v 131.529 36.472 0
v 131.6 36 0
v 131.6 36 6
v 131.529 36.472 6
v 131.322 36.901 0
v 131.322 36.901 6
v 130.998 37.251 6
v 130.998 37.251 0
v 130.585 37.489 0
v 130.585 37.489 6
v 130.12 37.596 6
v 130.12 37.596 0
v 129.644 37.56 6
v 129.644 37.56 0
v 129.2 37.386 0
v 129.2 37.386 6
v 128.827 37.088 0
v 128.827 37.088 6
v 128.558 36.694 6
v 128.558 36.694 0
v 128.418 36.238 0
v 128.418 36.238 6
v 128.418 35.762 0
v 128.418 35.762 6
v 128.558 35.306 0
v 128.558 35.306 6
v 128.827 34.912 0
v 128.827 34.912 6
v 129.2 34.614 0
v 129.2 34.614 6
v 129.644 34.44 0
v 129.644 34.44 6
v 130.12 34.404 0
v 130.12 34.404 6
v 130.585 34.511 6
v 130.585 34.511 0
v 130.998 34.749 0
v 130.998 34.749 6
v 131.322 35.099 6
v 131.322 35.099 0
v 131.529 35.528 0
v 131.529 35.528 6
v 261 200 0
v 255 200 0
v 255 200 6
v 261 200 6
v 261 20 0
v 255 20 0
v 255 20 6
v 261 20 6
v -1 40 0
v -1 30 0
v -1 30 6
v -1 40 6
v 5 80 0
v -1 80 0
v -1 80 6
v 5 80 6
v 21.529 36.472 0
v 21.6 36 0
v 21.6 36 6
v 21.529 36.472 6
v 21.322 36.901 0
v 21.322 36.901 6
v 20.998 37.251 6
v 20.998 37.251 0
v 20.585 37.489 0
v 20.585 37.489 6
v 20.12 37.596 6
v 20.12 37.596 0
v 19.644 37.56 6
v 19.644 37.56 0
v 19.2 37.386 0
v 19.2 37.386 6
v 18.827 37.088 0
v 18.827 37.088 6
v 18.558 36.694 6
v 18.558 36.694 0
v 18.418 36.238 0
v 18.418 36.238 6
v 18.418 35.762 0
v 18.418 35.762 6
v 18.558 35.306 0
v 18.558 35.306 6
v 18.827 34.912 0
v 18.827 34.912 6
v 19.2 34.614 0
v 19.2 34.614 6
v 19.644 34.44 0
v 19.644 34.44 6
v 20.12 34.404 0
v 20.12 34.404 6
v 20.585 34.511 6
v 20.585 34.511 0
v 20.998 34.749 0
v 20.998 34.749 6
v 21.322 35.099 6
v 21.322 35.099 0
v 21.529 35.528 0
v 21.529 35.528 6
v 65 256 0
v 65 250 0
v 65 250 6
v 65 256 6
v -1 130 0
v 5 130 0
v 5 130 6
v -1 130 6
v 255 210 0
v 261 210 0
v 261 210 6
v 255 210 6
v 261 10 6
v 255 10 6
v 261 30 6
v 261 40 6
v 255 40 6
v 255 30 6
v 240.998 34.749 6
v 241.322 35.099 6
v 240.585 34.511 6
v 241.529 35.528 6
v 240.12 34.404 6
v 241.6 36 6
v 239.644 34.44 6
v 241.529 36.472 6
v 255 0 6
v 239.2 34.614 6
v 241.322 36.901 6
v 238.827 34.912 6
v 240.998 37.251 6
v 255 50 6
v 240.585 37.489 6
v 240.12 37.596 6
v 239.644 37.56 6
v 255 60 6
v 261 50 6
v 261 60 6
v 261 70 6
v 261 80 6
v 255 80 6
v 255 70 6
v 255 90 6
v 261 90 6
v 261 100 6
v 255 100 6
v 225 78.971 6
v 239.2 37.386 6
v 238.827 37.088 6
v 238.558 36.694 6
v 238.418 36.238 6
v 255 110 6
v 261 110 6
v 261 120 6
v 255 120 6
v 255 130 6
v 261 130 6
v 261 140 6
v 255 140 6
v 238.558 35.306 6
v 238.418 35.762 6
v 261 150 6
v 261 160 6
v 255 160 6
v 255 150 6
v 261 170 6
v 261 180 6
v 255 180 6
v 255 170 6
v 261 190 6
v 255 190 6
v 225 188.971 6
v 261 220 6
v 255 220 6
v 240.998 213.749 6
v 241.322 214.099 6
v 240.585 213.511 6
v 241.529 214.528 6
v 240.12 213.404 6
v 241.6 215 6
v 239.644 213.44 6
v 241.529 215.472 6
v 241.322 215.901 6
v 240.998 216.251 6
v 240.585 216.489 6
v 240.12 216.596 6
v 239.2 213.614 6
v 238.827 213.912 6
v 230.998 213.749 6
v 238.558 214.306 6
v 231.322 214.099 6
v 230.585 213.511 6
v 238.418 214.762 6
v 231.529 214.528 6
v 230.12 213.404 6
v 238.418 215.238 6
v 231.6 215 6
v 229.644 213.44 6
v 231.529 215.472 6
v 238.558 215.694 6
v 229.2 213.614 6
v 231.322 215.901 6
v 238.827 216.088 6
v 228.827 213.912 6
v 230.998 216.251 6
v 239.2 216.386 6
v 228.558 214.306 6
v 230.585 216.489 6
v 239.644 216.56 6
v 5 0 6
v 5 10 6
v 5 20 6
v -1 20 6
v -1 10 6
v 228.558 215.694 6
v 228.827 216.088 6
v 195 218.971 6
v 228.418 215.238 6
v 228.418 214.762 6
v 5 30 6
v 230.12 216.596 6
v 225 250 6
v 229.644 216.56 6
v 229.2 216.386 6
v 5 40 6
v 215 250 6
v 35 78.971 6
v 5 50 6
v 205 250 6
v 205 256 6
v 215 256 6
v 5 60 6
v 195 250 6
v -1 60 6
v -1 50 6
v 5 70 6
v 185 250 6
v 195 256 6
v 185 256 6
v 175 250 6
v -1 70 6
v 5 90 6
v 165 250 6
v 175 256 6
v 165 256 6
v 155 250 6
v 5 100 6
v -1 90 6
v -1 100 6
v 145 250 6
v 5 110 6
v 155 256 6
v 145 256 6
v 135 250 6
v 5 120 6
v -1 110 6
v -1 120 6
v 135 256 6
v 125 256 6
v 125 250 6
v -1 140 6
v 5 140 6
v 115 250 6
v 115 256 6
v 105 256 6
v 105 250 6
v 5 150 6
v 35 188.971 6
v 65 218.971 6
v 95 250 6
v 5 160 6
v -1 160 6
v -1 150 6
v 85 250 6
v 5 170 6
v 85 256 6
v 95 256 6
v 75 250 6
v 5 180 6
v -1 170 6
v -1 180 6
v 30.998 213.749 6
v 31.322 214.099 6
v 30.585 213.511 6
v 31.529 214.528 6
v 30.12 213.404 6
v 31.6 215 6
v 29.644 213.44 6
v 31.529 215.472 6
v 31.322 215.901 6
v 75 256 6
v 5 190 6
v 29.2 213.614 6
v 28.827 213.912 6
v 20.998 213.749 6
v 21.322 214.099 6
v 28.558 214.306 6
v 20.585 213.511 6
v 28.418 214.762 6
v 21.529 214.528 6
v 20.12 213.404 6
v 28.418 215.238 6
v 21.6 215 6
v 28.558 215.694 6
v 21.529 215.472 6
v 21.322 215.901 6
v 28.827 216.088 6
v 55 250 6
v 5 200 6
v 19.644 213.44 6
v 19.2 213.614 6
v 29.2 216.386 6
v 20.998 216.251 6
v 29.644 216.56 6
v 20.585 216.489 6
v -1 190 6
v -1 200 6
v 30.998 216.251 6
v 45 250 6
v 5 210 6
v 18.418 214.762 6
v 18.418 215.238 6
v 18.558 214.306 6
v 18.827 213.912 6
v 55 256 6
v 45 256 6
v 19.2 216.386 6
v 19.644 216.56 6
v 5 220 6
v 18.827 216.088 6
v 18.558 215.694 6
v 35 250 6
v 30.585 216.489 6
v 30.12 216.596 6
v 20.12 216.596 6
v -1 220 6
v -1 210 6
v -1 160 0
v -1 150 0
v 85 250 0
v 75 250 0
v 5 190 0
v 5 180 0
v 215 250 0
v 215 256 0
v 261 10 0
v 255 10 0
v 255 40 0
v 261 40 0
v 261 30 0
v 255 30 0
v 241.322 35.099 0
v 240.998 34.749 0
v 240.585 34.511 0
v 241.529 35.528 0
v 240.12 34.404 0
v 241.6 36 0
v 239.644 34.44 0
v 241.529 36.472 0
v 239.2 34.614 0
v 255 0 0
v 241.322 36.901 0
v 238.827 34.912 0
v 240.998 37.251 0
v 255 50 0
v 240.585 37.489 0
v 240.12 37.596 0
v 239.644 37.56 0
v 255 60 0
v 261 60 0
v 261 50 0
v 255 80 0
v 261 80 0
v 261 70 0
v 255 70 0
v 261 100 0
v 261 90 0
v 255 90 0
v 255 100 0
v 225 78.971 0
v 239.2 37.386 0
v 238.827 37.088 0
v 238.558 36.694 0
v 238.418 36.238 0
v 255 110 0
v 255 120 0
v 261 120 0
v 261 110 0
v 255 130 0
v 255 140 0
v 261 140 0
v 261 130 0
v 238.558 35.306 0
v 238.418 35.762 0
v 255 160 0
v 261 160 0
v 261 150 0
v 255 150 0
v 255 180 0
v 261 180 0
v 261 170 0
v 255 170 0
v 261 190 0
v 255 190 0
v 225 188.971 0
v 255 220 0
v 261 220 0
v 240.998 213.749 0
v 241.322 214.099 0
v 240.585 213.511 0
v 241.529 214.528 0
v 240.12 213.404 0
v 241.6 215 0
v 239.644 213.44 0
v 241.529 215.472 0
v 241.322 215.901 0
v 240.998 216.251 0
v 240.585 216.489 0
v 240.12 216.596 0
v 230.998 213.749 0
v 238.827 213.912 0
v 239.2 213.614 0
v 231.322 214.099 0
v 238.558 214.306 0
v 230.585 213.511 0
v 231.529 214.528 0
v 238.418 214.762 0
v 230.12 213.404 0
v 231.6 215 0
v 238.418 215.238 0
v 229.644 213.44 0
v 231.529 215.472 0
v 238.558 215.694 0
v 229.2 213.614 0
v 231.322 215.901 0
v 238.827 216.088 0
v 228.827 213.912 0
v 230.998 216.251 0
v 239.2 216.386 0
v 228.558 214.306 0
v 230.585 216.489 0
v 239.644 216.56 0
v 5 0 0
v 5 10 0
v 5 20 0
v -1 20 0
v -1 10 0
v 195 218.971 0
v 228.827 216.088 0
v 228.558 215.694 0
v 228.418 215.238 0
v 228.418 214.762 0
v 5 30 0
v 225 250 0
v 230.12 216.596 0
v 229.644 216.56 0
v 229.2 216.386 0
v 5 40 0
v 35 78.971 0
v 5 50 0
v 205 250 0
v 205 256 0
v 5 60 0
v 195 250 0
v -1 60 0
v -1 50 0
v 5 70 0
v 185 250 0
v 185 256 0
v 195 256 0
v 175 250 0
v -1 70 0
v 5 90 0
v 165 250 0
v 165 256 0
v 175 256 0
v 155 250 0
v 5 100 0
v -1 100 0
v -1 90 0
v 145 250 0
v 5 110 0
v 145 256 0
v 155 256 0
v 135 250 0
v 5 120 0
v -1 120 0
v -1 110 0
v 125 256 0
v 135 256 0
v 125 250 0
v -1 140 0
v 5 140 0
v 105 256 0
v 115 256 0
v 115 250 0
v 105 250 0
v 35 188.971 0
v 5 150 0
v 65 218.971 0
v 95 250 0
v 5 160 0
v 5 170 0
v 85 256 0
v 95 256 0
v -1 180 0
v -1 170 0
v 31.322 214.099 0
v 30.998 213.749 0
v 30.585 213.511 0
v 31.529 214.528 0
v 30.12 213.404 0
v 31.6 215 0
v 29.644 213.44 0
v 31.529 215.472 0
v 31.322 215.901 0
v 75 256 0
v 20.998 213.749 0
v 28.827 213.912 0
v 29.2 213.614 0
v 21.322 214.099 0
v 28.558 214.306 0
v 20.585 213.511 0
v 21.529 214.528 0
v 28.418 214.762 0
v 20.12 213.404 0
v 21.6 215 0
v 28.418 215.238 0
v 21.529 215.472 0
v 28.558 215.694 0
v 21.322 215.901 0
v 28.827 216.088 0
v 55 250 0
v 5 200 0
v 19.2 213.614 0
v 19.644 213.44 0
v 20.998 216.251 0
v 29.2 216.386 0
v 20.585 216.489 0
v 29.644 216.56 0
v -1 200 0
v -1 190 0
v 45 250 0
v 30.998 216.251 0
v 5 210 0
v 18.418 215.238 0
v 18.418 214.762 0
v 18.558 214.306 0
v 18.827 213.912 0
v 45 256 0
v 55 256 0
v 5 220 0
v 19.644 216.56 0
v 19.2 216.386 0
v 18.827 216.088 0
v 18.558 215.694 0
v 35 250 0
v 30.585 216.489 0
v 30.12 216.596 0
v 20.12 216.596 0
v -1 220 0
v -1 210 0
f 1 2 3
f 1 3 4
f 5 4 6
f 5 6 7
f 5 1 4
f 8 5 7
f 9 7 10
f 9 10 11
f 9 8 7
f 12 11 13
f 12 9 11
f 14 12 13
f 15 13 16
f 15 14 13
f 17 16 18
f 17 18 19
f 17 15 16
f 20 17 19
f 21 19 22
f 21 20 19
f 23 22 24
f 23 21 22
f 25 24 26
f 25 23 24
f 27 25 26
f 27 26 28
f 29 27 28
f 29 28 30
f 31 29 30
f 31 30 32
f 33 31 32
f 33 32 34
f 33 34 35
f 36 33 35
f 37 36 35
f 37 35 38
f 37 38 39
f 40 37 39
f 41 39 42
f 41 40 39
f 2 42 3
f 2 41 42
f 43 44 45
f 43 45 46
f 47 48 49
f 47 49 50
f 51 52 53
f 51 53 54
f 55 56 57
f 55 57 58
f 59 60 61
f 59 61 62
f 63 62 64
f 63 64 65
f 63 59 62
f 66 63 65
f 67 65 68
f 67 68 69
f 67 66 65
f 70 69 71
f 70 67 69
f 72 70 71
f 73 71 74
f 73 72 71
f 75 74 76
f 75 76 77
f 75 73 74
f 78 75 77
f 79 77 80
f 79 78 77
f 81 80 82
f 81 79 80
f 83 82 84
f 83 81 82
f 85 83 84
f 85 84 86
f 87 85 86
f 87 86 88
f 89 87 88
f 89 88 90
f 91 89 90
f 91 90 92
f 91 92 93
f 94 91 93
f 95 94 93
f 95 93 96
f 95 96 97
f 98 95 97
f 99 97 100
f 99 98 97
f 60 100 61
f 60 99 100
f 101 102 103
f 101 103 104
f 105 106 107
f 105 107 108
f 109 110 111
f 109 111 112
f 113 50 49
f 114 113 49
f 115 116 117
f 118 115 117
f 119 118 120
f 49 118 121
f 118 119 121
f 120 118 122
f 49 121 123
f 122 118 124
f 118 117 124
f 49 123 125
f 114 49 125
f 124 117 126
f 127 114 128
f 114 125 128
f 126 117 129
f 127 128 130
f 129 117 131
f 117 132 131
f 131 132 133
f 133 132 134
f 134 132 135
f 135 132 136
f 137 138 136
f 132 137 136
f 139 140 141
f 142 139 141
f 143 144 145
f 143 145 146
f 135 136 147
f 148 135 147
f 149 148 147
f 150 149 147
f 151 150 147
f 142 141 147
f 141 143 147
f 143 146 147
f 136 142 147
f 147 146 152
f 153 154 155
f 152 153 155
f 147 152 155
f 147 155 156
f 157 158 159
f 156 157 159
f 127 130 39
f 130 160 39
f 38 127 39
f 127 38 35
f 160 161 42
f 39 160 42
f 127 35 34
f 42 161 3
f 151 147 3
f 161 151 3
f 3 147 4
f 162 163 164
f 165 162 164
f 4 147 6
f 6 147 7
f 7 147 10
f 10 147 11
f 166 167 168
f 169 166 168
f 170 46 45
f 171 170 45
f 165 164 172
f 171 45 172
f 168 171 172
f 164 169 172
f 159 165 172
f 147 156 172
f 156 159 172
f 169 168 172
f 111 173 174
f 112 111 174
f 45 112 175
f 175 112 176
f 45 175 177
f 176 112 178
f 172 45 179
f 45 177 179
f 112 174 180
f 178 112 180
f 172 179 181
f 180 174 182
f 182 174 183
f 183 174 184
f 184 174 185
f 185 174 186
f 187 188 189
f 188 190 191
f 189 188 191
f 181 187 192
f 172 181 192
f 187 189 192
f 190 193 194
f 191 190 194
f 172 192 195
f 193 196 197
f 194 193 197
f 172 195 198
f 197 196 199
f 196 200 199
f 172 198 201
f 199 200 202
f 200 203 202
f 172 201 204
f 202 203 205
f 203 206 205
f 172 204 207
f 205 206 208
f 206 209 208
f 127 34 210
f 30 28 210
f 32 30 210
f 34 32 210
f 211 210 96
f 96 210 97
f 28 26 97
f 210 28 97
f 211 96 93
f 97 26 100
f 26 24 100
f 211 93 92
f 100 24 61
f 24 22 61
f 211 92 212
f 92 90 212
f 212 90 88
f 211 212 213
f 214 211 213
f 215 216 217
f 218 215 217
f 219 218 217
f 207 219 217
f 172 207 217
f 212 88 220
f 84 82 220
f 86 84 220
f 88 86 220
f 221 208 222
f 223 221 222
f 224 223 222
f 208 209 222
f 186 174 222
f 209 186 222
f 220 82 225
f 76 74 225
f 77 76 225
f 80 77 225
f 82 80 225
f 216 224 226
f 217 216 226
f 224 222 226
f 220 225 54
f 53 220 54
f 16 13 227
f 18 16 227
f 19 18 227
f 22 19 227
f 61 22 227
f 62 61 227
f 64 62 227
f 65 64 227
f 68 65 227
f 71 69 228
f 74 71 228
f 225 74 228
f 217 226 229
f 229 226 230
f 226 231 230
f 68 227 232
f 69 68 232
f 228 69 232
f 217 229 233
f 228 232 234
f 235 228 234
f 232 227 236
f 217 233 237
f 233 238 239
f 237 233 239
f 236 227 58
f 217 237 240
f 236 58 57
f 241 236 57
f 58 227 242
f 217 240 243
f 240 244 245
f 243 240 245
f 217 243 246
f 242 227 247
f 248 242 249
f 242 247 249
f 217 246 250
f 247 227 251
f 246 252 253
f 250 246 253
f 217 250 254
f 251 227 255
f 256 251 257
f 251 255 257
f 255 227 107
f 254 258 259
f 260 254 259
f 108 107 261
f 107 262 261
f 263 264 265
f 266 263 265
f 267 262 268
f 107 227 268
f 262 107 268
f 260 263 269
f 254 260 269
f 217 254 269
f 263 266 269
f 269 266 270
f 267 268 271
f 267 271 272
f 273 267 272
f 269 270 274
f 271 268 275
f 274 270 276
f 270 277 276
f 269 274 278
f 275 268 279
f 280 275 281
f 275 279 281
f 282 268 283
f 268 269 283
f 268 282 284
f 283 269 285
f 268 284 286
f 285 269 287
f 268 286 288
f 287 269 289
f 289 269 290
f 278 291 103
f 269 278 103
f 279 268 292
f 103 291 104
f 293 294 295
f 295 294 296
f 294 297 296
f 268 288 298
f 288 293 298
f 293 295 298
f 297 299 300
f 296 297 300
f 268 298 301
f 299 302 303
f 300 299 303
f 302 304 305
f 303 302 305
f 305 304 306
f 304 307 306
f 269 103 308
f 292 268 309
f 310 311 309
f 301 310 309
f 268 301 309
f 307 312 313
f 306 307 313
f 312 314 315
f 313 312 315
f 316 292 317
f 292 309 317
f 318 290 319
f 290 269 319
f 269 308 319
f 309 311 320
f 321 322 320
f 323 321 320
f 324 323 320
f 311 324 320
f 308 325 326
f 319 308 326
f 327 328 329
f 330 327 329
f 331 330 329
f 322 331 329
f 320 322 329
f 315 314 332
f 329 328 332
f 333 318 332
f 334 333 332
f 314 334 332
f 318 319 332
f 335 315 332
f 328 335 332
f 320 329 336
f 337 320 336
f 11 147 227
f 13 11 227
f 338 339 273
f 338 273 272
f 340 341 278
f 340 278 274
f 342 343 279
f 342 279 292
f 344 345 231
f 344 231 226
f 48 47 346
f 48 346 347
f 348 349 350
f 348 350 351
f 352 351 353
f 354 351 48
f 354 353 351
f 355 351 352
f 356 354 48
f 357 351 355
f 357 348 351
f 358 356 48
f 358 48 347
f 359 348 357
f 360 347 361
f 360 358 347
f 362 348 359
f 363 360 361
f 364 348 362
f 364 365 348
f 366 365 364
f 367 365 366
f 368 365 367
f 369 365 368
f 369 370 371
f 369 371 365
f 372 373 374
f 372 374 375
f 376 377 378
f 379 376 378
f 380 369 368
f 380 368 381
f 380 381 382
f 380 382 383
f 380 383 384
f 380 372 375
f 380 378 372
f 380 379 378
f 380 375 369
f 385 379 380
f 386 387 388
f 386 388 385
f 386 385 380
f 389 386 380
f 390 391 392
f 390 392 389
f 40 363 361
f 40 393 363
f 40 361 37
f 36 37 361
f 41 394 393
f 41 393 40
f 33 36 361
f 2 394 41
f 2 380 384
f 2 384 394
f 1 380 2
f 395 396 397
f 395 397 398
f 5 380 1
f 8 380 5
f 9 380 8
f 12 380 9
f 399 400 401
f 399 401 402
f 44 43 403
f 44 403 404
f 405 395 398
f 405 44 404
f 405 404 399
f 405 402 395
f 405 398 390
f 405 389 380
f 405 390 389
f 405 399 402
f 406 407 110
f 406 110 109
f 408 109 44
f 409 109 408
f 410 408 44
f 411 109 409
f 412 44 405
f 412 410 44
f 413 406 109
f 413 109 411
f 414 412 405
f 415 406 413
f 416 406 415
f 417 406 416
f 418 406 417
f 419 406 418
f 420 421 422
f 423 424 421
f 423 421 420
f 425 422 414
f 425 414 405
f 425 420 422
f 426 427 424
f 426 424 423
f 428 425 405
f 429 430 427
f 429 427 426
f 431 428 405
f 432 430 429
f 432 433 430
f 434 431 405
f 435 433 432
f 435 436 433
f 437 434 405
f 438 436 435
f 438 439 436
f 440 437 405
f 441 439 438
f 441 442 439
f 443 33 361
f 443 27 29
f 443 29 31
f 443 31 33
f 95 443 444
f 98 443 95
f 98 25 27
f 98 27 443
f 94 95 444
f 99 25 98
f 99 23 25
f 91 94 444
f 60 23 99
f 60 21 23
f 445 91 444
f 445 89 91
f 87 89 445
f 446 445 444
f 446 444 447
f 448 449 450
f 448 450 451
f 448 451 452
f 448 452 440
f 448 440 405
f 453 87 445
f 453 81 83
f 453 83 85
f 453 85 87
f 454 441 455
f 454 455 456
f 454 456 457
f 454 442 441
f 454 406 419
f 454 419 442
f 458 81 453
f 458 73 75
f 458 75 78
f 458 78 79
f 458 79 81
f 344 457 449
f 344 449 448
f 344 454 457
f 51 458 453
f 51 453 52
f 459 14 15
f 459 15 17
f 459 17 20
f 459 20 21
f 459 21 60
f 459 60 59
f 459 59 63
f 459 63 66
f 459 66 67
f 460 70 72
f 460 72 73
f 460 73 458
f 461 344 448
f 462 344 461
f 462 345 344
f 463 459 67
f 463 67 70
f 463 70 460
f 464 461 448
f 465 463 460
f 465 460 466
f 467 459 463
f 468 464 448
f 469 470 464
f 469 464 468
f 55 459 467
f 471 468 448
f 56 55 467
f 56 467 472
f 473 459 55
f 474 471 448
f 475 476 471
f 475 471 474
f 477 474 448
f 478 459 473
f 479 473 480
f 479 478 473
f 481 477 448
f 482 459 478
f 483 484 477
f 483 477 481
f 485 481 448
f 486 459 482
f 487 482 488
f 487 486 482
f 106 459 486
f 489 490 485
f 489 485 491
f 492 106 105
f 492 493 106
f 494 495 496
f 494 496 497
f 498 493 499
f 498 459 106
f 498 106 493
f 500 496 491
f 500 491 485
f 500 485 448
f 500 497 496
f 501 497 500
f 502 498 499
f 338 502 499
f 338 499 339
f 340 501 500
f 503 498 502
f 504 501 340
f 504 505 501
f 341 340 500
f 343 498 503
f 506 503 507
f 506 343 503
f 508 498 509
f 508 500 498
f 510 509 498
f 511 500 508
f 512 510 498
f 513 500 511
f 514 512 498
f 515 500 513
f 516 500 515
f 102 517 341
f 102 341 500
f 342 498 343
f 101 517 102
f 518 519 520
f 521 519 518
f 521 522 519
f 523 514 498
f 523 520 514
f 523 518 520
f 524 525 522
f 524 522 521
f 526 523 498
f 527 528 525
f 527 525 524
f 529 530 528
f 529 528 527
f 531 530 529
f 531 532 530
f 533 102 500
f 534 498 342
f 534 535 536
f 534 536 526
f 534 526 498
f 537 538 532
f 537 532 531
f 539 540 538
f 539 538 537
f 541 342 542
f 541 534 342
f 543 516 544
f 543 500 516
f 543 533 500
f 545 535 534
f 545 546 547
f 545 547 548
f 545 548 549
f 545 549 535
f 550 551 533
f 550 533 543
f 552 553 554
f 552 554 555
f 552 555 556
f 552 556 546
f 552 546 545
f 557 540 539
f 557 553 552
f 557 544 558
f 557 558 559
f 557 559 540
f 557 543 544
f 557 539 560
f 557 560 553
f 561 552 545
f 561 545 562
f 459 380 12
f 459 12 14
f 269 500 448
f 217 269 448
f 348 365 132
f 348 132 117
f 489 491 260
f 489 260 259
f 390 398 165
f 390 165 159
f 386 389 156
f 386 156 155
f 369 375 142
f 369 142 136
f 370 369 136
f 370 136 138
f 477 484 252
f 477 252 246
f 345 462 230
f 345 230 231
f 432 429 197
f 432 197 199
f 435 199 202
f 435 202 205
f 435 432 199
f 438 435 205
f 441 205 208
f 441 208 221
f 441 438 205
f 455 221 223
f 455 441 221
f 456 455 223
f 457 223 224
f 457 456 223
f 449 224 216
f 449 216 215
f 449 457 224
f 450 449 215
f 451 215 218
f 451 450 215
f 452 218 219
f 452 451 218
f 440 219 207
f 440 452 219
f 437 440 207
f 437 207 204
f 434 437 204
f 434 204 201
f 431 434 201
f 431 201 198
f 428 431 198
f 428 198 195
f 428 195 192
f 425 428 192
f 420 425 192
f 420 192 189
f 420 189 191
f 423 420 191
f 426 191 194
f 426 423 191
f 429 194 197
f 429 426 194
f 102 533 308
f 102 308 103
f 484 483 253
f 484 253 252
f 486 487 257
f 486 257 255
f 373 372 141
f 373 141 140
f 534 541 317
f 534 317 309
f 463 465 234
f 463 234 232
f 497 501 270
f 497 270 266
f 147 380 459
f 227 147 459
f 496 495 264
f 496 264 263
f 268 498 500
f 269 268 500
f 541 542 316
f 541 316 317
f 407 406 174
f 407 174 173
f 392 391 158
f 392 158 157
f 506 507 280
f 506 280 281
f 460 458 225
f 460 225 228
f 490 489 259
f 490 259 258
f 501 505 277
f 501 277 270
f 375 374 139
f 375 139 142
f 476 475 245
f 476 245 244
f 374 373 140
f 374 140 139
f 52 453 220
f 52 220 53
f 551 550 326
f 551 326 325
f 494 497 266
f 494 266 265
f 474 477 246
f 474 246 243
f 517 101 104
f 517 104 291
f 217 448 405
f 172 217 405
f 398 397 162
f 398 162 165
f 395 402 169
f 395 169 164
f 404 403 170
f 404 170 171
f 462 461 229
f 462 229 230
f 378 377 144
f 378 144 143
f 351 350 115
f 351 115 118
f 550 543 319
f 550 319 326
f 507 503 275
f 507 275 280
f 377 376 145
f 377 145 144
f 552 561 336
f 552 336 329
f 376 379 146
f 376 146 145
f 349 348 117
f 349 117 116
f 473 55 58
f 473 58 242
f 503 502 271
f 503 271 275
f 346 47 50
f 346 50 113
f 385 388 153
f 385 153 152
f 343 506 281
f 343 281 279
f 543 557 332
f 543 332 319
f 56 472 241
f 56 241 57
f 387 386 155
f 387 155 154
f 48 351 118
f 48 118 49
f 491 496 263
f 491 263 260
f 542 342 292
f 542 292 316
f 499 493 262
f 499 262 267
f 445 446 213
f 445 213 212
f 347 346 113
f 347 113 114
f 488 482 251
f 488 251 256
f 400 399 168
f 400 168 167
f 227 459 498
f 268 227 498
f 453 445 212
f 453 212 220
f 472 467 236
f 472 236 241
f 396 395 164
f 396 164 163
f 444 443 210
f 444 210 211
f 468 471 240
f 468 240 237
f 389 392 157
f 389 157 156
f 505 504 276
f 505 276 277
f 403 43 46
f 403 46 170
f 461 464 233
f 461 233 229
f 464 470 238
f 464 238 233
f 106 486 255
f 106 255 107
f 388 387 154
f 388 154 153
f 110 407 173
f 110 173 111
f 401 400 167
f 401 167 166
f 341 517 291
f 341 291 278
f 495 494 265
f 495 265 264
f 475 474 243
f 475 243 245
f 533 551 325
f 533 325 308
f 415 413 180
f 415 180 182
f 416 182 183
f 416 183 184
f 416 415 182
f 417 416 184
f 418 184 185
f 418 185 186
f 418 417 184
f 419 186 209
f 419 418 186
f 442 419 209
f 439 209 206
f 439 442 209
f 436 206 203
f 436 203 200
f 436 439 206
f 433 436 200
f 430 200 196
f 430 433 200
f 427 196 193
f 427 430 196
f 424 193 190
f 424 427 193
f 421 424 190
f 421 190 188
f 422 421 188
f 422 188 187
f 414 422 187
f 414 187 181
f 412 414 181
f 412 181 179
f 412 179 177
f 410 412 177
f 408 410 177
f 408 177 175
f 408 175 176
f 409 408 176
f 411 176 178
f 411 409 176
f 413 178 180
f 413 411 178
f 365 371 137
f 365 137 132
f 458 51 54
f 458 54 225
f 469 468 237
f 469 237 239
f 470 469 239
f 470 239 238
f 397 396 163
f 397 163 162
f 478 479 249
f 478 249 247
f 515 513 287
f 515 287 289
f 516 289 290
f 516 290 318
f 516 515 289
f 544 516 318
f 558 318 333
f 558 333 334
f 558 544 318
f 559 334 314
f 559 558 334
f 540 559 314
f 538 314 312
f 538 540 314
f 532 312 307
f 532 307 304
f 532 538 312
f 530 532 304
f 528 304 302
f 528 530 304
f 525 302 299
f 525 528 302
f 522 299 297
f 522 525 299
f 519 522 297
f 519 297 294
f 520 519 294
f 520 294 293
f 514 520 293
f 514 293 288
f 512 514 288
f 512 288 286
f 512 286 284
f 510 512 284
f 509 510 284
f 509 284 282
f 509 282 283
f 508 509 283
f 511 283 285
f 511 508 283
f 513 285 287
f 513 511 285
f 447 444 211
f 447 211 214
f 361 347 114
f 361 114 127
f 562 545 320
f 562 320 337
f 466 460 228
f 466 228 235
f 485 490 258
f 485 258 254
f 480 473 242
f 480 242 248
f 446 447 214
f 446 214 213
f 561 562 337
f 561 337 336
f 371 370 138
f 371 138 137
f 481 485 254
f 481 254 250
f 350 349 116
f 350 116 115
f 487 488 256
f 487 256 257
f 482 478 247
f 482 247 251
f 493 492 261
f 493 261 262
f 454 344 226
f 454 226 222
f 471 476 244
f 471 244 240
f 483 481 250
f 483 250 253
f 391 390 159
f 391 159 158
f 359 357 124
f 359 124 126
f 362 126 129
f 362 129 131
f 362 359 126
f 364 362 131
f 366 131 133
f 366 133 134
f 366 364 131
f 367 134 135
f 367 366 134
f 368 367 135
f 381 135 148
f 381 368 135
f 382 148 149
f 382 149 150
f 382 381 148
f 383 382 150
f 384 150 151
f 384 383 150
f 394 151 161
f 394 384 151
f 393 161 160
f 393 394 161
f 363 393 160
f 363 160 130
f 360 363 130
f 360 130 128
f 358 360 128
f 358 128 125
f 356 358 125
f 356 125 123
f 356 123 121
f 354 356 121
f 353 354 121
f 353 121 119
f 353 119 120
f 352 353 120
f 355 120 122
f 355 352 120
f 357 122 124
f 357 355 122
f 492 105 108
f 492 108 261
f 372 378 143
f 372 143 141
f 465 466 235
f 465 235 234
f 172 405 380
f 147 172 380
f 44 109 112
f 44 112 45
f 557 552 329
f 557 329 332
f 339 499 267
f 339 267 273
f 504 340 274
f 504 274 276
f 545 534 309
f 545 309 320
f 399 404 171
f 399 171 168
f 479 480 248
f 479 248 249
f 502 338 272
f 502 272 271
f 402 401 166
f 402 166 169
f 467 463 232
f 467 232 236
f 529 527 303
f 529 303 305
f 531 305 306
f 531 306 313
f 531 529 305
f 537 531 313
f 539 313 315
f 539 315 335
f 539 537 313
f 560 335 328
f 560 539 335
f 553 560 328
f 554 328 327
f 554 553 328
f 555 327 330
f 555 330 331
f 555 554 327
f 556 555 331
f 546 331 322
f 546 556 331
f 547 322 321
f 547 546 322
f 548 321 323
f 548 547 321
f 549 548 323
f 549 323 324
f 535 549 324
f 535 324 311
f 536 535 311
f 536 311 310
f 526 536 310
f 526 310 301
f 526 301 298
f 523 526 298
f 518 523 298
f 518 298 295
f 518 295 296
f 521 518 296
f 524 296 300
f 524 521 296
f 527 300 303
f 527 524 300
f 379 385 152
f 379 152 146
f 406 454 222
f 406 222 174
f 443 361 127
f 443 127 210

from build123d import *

# Parameters (mm, degrees)
SKIZZE1_R                       = 1.6
AUFSATZ_LINEAR_AUSTRAGEN1_DEPTH = 6


with BuildPart() as part:
    # Skizze1 → Aufsatz-Linear austragen1 (new body)
    with BuildSketch(Plane.XY):
        Polygon((35, 250), (45, 250), (45, 256), (55, 256), (55, 250), (65, 250), (65, 256), (75, 256), (75, 250), (85, 250), (85, 256), (95, 256), (95, 250), (105, 250), (105, 256), (115, 256), (115, 250), (125, 250), (125, 256), (135, 256), (135, 250), (145, 250), (145, 256), (155, 256), (155, 250), (165, 250), (165, 256), (175, 256), (175, 250), (185, 250), (185, 256), (195, 256), (195, 250), (205, 250), (205, 256), (215, 256), (215, 250), (225, 250), (255, 220), (261, 220), (261, 210), (255, 210), (255, 200), (261, 200), (261, 190), (255, 190), (255, 180), (261, 180), (261, 170), (255, 170), (255, 160), (261, 160), (261, 150), (255, 150), (255, 140), (261, 140), (261, 130), (255, 130), (255, 120), (261, 120), (261, 110), (255, 110), (255, 100), (261, 100), (261, 90), (255, 90), (255, 80), (261, 80), (261, 70), (255, 70), (255, 60), (261, 60), (261, 50), (255, 50), (255, 40), (261, 40), (261, 30), (255, 30), (255, 20), (261, 20), (261, 10), (255, 10), (255, 0), (5, 0), (5, 10), (-1, 10), (-1, 20), (5, 20), (5, 30), (-1, 30), (-1, 40), (5, 40), (5, 50), (-1, 50), (-1, 60), (5, 60), (5, 70), (-1, 70), (-1, 80), (5, 80), (5, 90), (-1, 90), (-1, 100), (5, 100), (5, 110), (-1, 110), (-1, 120), (5, 120), (5, 130), (-1, 130), (-1, 140), (5, 140), (5, 150), (-1, 150), (-1, 160), (5, 160), (5, 170), (-1, 170), (-1, 180), (5, 180), (5, 190), (-1, 190), (-1, 200), (5, 200), (5, 210), (-1, 210), (-1, 220), (5, 220), align=None)
        with Locations((20, 215)):
            Circle(SKIZZE1_R, mode=Mode.SUBTRACT)
        with Locations((30, 215)):
            Circle(SKIZZE1_R, mode=Mode.SUBTRACT)
        with Locations((240, 215)):
            Circle(SKIZZE1_R, mode=Mode.SUBTRACT)
        with Locations((230, 215)):
            Circle(SKIZZE1_R, mode=Mode.SUBTRACT)
        with Locations((20, 36)):
            Circle(SKIZZE1_R, mode=Mode.SUBTRACT)
        with Locations((130, 36)):
            Circle(SKIZZE1_R, mode=Mode.SUBTRACT)
        with Locations((240, 36)):
            Circle(SKIZZE1_R, mode=Mode.SUBTRACT)
        Polygon((65, 218.971165398), (195, 218.971165398), (225, 188.971165398), (225, 78.971165398), (35, 78.971165398), (35, 188.971165398), align=None, mode=Mode.SUBTRACT)
    extrude(amount=AUFSATZ_LINEAR_AUSTRAGEN1_DEPTH)


solid = part.part
